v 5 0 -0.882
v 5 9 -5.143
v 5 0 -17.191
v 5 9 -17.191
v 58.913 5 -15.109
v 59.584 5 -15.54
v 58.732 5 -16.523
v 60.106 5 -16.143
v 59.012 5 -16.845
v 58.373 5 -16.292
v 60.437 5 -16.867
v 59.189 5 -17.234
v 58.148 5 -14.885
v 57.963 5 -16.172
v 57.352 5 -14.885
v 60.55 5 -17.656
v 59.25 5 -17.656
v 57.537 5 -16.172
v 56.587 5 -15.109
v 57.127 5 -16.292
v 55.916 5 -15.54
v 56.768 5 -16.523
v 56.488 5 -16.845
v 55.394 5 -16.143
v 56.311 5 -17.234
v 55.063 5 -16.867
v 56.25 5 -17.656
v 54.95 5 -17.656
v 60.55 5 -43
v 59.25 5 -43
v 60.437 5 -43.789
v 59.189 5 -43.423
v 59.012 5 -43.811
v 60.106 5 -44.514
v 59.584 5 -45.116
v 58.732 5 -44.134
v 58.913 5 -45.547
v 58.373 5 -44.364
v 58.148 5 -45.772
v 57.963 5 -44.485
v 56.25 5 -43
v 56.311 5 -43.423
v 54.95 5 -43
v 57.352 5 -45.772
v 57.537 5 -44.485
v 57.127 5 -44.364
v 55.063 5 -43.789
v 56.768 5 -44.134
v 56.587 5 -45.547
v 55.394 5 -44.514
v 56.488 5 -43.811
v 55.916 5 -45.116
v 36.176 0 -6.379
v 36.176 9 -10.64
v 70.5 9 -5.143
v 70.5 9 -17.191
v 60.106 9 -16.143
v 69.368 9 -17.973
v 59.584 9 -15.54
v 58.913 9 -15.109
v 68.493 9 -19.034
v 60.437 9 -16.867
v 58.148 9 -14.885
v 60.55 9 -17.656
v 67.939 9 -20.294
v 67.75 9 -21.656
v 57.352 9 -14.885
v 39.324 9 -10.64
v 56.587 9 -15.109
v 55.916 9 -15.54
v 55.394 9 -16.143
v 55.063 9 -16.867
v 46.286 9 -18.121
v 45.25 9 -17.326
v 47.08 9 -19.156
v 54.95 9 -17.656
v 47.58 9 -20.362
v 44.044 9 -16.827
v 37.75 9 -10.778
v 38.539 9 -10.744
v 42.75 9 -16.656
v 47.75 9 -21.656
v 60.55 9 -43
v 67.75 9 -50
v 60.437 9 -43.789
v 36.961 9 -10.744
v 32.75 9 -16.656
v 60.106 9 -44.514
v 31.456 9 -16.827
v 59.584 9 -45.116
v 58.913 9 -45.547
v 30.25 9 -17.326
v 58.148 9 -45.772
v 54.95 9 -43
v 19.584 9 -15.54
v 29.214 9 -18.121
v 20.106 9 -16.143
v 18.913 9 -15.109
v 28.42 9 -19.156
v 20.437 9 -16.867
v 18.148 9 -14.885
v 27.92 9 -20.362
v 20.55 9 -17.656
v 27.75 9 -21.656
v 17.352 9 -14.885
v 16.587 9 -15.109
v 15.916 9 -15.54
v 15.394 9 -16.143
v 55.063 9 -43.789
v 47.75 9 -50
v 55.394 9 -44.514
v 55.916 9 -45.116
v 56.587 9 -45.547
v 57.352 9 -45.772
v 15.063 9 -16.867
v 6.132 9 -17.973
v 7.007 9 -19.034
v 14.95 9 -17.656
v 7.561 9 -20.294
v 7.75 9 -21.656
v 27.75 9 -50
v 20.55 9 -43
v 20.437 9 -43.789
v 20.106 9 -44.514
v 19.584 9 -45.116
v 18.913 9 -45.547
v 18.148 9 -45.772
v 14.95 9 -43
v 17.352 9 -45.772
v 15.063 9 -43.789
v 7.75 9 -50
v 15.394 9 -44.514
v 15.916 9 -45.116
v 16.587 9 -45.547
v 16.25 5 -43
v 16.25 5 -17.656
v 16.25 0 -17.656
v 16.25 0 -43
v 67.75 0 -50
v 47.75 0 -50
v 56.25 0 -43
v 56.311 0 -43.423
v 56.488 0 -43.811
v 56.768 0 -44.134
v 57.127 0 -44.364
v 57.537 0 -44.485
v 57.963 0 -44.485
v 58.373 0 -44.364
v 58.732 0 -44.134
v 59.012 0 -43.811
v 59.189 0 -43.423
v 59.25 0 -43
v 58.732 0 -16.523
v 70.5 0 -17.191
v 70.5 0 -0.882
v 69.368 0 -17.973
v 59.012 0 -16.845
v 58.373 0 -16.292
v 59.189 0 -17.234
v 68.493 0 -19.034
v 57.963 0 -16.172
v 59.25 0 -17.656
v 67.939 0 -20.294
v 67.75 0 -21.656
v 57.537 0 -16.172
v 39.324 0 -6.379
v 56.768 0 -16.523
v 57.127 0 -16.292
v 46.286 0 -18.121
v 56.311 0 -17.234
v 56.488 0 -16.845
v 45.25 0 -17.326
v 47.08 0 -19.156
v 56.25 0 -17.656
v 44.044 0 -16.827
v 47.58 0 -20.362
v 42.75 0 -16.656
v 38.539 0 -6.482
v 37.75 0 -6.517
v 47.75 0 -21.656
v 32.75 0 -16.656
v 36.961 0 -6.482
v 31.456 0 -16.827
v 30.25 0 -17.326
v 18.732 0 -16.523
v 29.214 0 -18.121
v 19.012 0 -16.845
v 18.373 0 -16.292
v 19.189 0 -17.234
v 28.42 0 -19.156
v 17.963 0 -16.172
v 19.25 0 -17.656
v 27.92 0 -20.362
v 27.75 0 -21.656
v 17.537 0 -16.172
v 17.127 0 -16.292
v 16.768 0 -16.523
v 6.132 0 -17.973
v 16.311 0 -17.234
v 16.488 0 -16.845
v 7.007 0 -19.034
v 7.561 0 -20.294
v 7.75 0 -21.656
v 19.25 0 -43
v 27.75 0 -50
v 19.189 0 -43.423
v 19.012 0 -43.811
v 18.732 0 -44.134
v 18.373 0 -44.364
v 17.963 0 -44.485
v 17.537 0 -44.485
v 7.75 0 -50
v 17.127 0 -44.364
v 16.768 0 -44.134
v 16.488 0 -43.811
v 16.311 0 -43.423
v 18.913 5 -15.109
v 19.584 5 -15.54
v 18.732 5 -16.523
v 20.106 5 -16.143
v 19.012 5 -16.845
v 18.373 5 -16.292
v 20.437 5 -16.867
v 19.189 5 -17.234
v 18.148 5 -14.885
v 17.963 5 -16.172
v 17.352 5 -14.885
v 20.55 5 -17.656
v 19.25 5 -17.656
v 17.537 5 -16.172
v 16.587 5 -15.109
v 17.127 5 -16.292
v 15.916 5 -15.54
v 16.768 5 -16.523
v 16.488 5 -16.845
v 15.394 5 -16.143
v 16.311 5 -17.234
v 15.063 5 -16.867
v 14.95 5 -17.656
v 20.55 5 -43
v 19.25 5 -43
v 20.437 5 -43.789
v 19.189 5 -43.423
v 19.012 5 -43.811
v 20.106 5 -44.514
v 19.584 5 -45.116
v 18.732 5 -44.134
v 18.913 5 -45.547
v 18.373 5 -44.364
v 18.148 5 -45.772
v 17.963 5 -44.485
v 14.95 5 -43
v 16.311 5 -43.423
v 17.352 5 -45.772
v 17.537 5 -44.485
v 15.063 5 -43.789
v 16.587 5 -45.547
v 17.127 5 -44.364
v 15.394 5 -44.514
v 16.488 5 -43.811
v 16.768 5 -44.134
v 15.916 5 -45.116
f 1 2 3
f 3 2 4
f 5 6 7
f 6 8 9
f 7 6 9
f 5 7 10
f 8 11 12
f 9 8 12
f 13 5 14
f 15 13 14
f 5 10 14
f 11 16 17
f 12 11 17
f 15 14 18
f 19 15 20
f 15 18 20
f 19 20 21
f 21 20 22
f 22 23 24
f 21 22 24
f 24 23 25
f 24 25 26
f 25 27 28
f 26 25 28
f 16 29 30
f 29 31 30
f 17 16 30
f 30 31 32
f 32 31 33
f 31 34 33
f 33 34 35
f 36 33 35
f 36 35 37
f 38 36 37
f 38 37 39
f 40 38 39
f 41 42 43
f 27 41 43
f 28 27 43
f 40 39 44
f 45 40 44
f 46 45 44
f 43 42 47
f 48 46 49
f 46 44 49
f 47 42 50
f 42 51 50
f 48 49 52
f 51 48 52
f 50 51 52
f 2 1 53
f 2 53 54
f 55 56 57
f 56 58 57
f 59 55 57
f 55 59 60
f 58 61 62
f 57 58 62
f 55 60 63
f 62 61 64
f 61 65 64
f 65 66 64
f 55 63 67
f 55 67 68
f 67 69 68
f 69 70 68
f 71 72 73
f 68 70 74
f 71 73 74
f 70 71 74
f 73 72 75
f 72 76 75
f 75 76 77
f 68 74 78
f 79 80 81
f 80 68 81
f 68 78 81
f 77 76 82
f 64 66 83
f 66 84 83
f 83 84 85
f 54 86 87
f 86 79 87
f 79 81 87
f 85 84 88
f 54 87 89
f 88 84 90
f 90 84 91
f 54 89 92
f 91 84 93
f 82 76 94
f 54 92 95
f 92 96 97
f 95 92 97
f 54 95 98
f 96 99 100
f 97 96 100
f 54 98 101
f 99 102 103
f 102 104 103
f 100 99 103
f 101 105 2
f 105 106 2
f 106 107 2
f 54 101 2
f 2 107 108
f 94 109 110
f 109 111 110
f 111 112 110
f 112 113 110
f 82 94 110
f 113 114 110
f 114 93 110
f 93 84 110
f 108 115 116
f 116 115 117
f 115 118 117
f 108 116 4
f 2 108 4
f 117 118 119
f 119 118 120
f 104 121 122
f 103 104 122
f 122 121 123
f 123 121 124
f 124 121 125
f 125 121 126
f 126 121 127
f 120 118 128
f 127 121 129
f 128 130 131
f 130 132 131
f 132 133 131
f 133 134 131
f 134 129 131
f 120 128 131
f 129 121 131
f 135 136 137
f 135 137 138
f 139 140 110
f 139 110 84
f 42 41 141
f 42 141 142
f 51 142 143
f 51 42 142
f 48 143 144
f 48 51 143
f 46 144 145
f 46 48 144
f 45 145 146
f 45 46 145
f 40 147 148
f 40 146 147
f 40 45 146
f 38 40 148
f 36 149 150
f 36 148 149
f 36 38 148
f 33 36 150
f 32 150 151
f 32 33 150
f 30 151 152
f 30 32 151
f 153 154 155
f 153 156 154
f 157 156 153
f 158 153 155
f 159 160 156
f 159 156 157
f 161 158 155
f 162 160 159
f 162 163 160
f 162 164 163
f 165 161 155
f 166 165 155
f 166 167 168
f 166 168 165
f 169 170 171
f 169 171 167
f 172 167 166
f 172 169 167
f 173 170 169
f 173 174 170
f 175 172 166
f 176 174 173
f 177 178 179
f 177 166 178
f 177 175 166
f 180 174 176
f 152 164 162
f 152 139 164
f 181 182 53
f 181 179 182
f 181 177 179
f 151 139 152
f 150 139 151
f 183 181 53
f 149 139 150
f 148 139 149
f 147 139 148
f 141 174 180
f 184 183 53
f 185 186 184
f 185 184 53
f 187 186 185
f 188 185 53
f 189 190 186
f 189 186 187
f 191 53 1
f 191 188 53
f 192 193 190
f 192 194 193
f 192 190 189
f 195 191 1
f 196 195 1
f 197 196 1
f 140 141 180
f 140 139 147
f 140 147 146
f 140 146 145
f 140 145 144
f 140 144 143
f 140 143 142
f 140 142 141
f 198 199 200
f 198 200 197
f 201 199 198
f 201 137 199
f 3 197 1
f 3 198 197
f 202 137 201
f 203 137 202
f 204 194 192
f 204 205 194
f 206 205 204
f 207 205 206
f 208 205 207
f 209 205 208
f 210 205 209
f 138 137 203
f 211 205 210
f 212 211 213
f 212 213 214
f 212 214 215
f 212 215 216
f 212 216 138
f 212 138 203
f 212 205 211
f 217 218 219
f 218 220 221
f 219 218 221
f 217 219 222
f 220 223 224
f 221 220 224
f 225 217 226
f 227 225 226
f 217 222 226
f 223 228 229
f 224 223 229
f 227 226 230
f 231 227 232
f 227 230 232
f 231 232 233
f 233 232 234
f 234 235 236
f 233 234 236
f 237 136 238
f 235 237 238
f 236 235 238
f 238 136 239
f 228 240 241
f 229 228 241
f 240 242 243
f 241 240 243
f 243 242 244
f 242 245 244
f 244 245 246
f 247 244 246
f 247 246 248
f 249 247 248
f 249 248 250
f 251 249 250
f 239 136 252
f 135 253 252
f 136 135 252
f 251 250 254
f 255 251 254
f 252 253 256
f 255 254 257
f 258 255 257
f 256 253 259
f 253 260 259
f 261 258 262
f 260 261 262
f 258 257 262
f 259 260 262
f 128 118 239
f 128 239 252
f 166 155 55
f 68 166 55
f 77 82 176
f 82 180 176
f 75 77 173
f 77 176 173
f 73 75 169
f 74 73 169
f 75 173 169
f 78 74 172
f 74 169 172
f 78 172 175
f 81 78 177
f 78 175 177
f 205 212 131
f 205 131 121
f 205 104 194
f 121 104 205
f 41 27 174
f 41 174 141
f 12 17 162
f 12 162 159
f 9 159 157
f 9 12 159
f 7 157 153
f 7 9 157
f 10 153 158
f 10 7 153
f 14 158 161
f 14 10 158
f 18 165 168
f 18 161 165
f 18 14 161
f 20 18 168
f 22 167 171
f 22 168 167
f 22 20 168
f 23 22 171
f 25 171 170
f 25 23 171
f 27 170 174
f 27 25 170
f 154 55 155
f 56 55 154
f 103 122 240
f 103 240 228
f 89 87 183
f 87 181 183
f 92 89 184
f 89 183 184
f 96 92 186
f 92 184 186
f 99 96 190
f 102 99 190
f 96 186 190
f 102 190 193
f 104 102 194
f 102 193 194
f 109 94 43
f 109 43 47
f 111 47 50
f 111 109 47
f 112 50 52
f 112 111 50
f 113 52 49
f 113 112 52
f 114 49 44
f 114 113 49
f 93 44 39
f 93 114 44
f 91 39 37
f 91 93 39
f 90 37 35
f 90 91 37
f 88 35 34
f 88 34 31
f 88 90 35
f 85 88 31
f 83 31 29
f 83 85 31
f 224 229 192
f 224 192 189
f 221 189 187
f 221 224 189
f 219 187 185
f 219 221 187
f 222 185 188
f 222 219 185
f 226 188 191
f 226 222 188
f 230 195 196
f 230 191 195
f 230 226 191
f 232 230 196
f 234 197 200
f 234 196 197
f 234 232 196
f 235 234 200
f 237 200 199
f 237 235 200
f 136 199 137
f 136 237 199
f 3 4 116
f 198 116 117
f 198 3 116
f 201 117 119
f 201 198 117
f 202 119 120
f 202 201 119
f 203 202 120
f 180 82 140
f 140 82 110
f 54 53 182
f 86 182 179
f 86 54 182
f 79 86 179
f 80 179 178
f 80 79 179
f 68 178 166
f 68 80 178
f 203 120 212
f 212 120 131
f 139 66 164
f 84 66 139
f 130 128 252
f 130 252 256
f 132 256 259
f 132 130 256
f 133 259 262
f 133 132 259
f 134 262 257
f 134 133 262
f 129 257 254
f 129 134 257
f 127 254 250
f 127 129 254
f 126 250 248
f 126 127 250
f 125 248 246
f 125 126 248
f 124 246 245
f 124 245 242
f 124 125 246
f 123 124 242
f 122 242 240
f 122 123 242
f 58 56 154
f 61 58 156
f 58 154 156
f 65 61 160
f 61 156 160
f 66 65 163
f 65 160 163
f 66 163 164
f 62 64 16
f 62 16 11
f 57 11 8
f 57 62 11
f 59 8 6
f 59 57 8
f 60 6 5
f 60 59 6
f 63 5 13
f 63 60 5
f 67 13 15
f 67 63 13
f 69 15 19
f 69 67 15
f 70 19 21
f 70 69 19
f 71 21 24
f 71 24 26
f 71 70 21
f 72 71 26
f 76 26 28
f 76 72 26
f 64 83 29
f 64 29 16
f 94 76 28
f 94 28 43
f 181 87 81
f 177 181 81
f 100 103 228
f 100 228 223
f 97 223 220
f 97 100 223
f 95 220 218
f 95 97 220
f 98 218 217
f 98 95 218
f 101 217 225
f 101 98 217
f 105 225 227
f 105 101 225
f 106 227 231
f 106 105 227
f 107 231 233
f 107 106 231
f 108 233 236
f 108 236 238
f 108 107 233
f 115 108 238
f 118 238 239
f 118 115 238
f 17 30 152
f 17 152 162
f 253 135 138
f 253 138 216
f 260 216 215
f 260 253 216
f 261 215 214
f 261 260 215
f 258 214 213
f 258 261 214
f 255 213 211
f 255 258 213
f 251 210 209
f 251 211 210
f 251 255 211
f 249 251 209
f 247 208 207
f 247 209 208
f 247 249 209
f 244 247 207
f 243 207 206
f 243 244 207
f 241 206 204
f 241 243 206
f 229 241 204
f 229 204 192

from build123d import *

# Parameters (mm, degrees)
BOSS_EXTRUDE1_DEPTH = 9
CUT_EXTRUDE2_REACH  = 93.001
SKETCH5_W           = 20
SKETCH5_H           = 33.343656478
SKETCH5_W_2         = 7.75
CUT_EXTRUDE3_DEPTH  = 10
FILLET1_R           = 5
CUT_EXTRUDE4_DEPTH  = 4
CHAMFER1_SIZE       = 9
CHAMFER1_SIZE_2     = 4.196768923
FILLET2_R           = 10
CUT_EXTRUDE5_REACH  = 93.001
SKETCH7_W           = 5
SKETCH7_H           = 18.120809616


with BuildPart() as part:
    # Sketch1 → Boss-Extrude1 (new body)
    with BuildSketch(Plane(origin=(0, 0, 0), x_dir=(1, 0, 0), z_dir=(0, 1, 0))):
        Polygon((0, 0), (0, 50), (75.5, 50), (75.5, 0), (37.75, 6.656343522), align=None)
    extrude(amount=BOSS_EXTRUDE1_DEPTH)

    # Sketch4 → Cut-Extrude2 (cut, up to next)
    with BuildSketch(Plane(origin=(0, 9, 0), x_dir=(1, 0, 0), z_dir=(0, 1, 0)), mode=Mode.PRIVATE) as cut_extrude2_sk1:
        with BuildLine():
            Line((19.25, 43), (19.25, 17.656343522))
            ThreePointArc((19.25, 17.656343522), (17.75, 16.156343522), (16.25, 17.656343522))
            Line((16.25, 17.656343522), (16.25, 43))
            ThreePointArc((16.25, 43), (17.75, 44.5), (19.25, 43))
        make_face()
    cut_extrude2_tool1 = extrude(cut_extrude2_sk1.sketch, amount=-CUT_EXTRUDE2_REACH, mode=Mode.PRIVATE) & part.part
    # Sketch4 → Cut-Extrude2 (cut, up to next)
    with BuildSketch(Plane(origin=(0, 9, 0), x_dir=(1, 0, 0), z_dir=(0, 1, 0)), mode=Mode.PRIVATE) as cut_extrude2_sk2:
        with BuildLine():
            Line((59.25, 43), (59.25, 17.656343522))
            ThreePointArc((59.25, 17.656343522), (57.75, 16.156343522), (56.25, 17.656343522))
            Line((56.25, 17.656343522), (56.25, 43))
            ThreePointArc((56.25, 43), (57.75, 44.5), (59.25, 43))
        make_face()
    cut_extrude2_tool2 = extrude(cut_extrude2_sk2.sketch, amount=-CUT_EXTRUDE2_REACH, mode=Mode.PRIVATE) & part.part
    add(cut_extrude2_tool1.solids().sort_by_distance((17.75, 9, -30.328172))[0], mode=Mode.SUBTRACT)
    add(cut_extrude2_tool2.solids().sort_by_distance((57.75, 9, -30.328172))[0], mode=Mode.SUBTRACT)

    # Sketch5 → Cut-Extrude3 (cut)
    with BuildSketch(Plane(origin=(0, 9, 0), x_dir=(1, 0, 0), z_dir=(0, 1, 0))):
        with Locations((37.75, 33.328171761)):
            Rectangle(SKETCH5_W, SKETCH5_H)
        with Locations((71.625, 33.328171761)):
            Rectangle(SKETCH5_W_2, SKETCH5_H)
        with Locations((3.875, 33.328171761)):
            Rectangle(SKETCH5_W_2, SKETCH5_H)
    extrude(amount=-CUT_EXTRUDE3_DEPTH, mode=Mode.SUBTRACT)

    # Fillet1
    fillet1_edges = [part.edges().sort_by_distance(p)[0] for p in [
        (27.75, 4.5, -16.656343522),
        (47.75, 4.5, -16.656343522),
        (7.75, 4.5, -16.656343522),
        (67.75, 4.5, -16.656343522),
    ]]
    fillet(fillet1_edges, radius=FILLET1_R)

    # Sketch6 → Cut-Extrude4 (cut)
    with BuildSketch(Plane(origin=(0, 9, 0), x_dir=(1, 0, 0), z_dir=(0, 1, 0))):
        with BuildLine():
            Line((20.55, 43), (20.55, 17.656343522))
            ThreePointArc((20.55, 17.656343522), (17.75, 14.856343522), (14.95, 17.656343522))
            Line((14.95, 17.656343522), (14.95, 43))
            ThreePointArc((14.95, 43), (17.75, 45.8), (20.55, 43))
        make_face()
        with BuildLine():
            Line((60.55, 43), (60.55, 17.656343522))
            ThreePointArc((60.55, 17.656343522), (57.75, 14.856343522), (54.95, 17.656343522))
            Line((54.95, 17.656343522), (54.95, 43))
            ThreePointArc((54.95, 43), (57.75, 45.8), (60.55, 43))
        make_face()
    extrude(amount=-CUT_EXTRUDE4_DEPTH, mode=Mode.SUBTRACT)

    # Chamfer1
    # the kernel refuses this chamfer: 9, 4.196768923 mm, written as the material it takes off along each edge
    with BuildSketch(Plane(origin=(98.464514589, 9, 4.049263521), x_dir=(-0.0028324039269935573, -0.9998669641130703, 0.01606336089697195), z_dir=(-0.9848077530122074, 0, -0.17364817766693472))) as chamfer1_piece_1_section:
        Polygon((CHAMFER1_SIZE * 0.999866964113, -CHAMFER1_SIZE * 0.0163111641311), (-CHAMFER1_SIZE_2 * 0.0163111641326, -CHAMFER1_SIZE_2 * 0.999866964207), (0, 0), align=None)
    chamfer1_piece_1 = extrude(amount=84.969913084, mode=Mode.PRIVATE)
    chamfer1_piece_1 = split(chamfer1_piece_1, bisect_by=Plane(origin=(68.314499837, 5.890721228, -12.045689495), z_dir=(0.17364817766693472, 0, 0.9848077530122074)), keep=Keep.TOP, mode=Mode.PRIVATE)
    add(chamfer1_piece_1, mode=Mode.SUBTRACT)
    with BuildSketch(Plane(origin=(60.714514589, 9, -10.705607043), x_dir=(0.0028324039269935768, -0.9998669641130703, 0.016063360896972065), z_dir=(-0.9848077530122074, 0, 0.17364817766693472))) as chamfer1_piece_2_section:
        Polygon((CHAMFER1_SIZE * 0.999866964113, -CHAMFER1_SIZE * 0.0163111641311), (-CHAMFER1_SIZE_2 * 0.0163111641326, -CHAMFER1_SIZE_2 * 0.999866964207), (0, 0), align=None)
    chamfer1_piece_2 = extrude(amount=84.969913084, mode=Mode.PRIVATE)
    chamfer1_piece_2 = split(chamfer1_piece_2, bisect_by=Plane(origin=(7.185500163, 5.890721228, -12.045689495), z_dir=(-0.17364817766693472, 0, 0.9848077530122074)), keep=Keep.TOP, mode=Mode.PRIVATE)
    add(chamfer1_piece_2, mode=Mode.SUBTRACT)
    with BuildSketch(Plane(origin=(98.464514589, 9, 4.049263521), x_dir=(-0.0028324039269935573, -0.9998669641130703, 0.01606336089697195), z_dir=(-0.9848077530122074, 0, -0.17364817766693472))) as chamfer1_piece_3a_section:
        Polygon((CHAMFER1_SIZE * 0.999866964113, -CHAMFER1_SIZE * 0.0163111641311), (-CHAMFER1_SIZE_2 * 0.0163111641326, -CHAMFER1_SIZE_2 * 0.999866964207), (0, 0), align=None)
    chamfer1_piece_3a = extrude(amount=84.969913084, mode=Mode.PRIVATE)
    chamfer1_piece_3a = split(chamfer1_piece_3a, bisect_by=Plane(origin=(29.282530451, 6.096120999, -5.163300182), z_dir=(-0.17364817766693472, 0, -0.9848077530122074)), keep=Keep.TOP, mode=Mode.PRIVATE)
    with BuildSketch(Plane(origin=(60.714514589, 9, -10.705607043), x_dir=(0.0028324039269935768, -0.9998669641130703, 0.016063360896972065), z_dir=(-0.9848077530122074, 0, 0.17364817766693472))) as chamfer1_piece_3b_section:
        Polygon((CHAMFER1_SIZE * 0.999866964113, -CHAMFER1_SIZE * 0.0163111641311), (-CHAMFER1_SIZE_2 * 0.0163111641326, -CHAMFER1_SIZE_2 * 0.999866964207), (0, 0), align=None)
    chamfer1_piece_3b = extrude(amount=84.969913084, mode=Mode.PRIVATE)
    chamfer1_piece_3b = split(chamfer1_piece_3b, bisect_by=Plane(origin=(46.217469549, 6.096120999, -5.163300182), z_dir=(0.17364817766693472, 0, -0.9848077530122074)), keep=Keep.TOP, mode=Mode.PRIVATE)
    chamfer1_piece_3 = chamfer1_piece_3a & chamfer1_piece_3b
    add(chamfer1_piece_3, mode=Mode.SUBTRACT)

    # Fillet2
    fillet2_edges = [part.edges().sort_by_distance(p)[0] for p in [
        (37.75, 4.5, -8.787098946),
    ]]
    fillet(fillet2_edges, radius=FILLET2_R)

    # Sketch7 → Cut-Extrude5 (cut, up to next)
    with BuildSketch(Plane(origin=(0, 9, 0), x_dir=(1, 0, 0), z_dir=(0, 1, 0)), mode=Mode.PRIVATE) as cut_extrude5_sk1:
        with Locations((2.5, 9.060404808)):
            Rectangle(SKETCH7_W, SKETCH7_H)
    cut_extrude5_tool1 = extrude(cut_extrude5_sk1.sketch, amount=-CUT_EXTRUDE5_REACH, mode=Mode.PRIVATE) & part.part
    # Sketch7 → Cut-Extrude5 (cut, up to next)
    with BuildSketch(Plane(origin=(0, 9, 0), x_dir=(1, 0, 0), z_dir=(0, 1, 0)), mode=Mode.PRIVATE) as cut_extrude5_sk2:
        with Locations((73, 9.060404808)):
            Rectangle(SKETCH7_W, SKETCH7_H)
    cut_extrude5_tool2 = extrude(cut_extrude5_sk2.sketch, amount=-CUT_EXTRUDE5_REACH, mode=Mode.PRIVATE) & part.part
    add(cut_extrude5_tool1.solids().sort_by_distance((2.5, 9, -9.060405))[0], mode=Mode.SUBTRACT)
    add(cut_extrude5_tool2.solids().sort_by_distance((73, 9, -9.060405))[0], mode=Mode.SUBTRACT)


solid = part.part
